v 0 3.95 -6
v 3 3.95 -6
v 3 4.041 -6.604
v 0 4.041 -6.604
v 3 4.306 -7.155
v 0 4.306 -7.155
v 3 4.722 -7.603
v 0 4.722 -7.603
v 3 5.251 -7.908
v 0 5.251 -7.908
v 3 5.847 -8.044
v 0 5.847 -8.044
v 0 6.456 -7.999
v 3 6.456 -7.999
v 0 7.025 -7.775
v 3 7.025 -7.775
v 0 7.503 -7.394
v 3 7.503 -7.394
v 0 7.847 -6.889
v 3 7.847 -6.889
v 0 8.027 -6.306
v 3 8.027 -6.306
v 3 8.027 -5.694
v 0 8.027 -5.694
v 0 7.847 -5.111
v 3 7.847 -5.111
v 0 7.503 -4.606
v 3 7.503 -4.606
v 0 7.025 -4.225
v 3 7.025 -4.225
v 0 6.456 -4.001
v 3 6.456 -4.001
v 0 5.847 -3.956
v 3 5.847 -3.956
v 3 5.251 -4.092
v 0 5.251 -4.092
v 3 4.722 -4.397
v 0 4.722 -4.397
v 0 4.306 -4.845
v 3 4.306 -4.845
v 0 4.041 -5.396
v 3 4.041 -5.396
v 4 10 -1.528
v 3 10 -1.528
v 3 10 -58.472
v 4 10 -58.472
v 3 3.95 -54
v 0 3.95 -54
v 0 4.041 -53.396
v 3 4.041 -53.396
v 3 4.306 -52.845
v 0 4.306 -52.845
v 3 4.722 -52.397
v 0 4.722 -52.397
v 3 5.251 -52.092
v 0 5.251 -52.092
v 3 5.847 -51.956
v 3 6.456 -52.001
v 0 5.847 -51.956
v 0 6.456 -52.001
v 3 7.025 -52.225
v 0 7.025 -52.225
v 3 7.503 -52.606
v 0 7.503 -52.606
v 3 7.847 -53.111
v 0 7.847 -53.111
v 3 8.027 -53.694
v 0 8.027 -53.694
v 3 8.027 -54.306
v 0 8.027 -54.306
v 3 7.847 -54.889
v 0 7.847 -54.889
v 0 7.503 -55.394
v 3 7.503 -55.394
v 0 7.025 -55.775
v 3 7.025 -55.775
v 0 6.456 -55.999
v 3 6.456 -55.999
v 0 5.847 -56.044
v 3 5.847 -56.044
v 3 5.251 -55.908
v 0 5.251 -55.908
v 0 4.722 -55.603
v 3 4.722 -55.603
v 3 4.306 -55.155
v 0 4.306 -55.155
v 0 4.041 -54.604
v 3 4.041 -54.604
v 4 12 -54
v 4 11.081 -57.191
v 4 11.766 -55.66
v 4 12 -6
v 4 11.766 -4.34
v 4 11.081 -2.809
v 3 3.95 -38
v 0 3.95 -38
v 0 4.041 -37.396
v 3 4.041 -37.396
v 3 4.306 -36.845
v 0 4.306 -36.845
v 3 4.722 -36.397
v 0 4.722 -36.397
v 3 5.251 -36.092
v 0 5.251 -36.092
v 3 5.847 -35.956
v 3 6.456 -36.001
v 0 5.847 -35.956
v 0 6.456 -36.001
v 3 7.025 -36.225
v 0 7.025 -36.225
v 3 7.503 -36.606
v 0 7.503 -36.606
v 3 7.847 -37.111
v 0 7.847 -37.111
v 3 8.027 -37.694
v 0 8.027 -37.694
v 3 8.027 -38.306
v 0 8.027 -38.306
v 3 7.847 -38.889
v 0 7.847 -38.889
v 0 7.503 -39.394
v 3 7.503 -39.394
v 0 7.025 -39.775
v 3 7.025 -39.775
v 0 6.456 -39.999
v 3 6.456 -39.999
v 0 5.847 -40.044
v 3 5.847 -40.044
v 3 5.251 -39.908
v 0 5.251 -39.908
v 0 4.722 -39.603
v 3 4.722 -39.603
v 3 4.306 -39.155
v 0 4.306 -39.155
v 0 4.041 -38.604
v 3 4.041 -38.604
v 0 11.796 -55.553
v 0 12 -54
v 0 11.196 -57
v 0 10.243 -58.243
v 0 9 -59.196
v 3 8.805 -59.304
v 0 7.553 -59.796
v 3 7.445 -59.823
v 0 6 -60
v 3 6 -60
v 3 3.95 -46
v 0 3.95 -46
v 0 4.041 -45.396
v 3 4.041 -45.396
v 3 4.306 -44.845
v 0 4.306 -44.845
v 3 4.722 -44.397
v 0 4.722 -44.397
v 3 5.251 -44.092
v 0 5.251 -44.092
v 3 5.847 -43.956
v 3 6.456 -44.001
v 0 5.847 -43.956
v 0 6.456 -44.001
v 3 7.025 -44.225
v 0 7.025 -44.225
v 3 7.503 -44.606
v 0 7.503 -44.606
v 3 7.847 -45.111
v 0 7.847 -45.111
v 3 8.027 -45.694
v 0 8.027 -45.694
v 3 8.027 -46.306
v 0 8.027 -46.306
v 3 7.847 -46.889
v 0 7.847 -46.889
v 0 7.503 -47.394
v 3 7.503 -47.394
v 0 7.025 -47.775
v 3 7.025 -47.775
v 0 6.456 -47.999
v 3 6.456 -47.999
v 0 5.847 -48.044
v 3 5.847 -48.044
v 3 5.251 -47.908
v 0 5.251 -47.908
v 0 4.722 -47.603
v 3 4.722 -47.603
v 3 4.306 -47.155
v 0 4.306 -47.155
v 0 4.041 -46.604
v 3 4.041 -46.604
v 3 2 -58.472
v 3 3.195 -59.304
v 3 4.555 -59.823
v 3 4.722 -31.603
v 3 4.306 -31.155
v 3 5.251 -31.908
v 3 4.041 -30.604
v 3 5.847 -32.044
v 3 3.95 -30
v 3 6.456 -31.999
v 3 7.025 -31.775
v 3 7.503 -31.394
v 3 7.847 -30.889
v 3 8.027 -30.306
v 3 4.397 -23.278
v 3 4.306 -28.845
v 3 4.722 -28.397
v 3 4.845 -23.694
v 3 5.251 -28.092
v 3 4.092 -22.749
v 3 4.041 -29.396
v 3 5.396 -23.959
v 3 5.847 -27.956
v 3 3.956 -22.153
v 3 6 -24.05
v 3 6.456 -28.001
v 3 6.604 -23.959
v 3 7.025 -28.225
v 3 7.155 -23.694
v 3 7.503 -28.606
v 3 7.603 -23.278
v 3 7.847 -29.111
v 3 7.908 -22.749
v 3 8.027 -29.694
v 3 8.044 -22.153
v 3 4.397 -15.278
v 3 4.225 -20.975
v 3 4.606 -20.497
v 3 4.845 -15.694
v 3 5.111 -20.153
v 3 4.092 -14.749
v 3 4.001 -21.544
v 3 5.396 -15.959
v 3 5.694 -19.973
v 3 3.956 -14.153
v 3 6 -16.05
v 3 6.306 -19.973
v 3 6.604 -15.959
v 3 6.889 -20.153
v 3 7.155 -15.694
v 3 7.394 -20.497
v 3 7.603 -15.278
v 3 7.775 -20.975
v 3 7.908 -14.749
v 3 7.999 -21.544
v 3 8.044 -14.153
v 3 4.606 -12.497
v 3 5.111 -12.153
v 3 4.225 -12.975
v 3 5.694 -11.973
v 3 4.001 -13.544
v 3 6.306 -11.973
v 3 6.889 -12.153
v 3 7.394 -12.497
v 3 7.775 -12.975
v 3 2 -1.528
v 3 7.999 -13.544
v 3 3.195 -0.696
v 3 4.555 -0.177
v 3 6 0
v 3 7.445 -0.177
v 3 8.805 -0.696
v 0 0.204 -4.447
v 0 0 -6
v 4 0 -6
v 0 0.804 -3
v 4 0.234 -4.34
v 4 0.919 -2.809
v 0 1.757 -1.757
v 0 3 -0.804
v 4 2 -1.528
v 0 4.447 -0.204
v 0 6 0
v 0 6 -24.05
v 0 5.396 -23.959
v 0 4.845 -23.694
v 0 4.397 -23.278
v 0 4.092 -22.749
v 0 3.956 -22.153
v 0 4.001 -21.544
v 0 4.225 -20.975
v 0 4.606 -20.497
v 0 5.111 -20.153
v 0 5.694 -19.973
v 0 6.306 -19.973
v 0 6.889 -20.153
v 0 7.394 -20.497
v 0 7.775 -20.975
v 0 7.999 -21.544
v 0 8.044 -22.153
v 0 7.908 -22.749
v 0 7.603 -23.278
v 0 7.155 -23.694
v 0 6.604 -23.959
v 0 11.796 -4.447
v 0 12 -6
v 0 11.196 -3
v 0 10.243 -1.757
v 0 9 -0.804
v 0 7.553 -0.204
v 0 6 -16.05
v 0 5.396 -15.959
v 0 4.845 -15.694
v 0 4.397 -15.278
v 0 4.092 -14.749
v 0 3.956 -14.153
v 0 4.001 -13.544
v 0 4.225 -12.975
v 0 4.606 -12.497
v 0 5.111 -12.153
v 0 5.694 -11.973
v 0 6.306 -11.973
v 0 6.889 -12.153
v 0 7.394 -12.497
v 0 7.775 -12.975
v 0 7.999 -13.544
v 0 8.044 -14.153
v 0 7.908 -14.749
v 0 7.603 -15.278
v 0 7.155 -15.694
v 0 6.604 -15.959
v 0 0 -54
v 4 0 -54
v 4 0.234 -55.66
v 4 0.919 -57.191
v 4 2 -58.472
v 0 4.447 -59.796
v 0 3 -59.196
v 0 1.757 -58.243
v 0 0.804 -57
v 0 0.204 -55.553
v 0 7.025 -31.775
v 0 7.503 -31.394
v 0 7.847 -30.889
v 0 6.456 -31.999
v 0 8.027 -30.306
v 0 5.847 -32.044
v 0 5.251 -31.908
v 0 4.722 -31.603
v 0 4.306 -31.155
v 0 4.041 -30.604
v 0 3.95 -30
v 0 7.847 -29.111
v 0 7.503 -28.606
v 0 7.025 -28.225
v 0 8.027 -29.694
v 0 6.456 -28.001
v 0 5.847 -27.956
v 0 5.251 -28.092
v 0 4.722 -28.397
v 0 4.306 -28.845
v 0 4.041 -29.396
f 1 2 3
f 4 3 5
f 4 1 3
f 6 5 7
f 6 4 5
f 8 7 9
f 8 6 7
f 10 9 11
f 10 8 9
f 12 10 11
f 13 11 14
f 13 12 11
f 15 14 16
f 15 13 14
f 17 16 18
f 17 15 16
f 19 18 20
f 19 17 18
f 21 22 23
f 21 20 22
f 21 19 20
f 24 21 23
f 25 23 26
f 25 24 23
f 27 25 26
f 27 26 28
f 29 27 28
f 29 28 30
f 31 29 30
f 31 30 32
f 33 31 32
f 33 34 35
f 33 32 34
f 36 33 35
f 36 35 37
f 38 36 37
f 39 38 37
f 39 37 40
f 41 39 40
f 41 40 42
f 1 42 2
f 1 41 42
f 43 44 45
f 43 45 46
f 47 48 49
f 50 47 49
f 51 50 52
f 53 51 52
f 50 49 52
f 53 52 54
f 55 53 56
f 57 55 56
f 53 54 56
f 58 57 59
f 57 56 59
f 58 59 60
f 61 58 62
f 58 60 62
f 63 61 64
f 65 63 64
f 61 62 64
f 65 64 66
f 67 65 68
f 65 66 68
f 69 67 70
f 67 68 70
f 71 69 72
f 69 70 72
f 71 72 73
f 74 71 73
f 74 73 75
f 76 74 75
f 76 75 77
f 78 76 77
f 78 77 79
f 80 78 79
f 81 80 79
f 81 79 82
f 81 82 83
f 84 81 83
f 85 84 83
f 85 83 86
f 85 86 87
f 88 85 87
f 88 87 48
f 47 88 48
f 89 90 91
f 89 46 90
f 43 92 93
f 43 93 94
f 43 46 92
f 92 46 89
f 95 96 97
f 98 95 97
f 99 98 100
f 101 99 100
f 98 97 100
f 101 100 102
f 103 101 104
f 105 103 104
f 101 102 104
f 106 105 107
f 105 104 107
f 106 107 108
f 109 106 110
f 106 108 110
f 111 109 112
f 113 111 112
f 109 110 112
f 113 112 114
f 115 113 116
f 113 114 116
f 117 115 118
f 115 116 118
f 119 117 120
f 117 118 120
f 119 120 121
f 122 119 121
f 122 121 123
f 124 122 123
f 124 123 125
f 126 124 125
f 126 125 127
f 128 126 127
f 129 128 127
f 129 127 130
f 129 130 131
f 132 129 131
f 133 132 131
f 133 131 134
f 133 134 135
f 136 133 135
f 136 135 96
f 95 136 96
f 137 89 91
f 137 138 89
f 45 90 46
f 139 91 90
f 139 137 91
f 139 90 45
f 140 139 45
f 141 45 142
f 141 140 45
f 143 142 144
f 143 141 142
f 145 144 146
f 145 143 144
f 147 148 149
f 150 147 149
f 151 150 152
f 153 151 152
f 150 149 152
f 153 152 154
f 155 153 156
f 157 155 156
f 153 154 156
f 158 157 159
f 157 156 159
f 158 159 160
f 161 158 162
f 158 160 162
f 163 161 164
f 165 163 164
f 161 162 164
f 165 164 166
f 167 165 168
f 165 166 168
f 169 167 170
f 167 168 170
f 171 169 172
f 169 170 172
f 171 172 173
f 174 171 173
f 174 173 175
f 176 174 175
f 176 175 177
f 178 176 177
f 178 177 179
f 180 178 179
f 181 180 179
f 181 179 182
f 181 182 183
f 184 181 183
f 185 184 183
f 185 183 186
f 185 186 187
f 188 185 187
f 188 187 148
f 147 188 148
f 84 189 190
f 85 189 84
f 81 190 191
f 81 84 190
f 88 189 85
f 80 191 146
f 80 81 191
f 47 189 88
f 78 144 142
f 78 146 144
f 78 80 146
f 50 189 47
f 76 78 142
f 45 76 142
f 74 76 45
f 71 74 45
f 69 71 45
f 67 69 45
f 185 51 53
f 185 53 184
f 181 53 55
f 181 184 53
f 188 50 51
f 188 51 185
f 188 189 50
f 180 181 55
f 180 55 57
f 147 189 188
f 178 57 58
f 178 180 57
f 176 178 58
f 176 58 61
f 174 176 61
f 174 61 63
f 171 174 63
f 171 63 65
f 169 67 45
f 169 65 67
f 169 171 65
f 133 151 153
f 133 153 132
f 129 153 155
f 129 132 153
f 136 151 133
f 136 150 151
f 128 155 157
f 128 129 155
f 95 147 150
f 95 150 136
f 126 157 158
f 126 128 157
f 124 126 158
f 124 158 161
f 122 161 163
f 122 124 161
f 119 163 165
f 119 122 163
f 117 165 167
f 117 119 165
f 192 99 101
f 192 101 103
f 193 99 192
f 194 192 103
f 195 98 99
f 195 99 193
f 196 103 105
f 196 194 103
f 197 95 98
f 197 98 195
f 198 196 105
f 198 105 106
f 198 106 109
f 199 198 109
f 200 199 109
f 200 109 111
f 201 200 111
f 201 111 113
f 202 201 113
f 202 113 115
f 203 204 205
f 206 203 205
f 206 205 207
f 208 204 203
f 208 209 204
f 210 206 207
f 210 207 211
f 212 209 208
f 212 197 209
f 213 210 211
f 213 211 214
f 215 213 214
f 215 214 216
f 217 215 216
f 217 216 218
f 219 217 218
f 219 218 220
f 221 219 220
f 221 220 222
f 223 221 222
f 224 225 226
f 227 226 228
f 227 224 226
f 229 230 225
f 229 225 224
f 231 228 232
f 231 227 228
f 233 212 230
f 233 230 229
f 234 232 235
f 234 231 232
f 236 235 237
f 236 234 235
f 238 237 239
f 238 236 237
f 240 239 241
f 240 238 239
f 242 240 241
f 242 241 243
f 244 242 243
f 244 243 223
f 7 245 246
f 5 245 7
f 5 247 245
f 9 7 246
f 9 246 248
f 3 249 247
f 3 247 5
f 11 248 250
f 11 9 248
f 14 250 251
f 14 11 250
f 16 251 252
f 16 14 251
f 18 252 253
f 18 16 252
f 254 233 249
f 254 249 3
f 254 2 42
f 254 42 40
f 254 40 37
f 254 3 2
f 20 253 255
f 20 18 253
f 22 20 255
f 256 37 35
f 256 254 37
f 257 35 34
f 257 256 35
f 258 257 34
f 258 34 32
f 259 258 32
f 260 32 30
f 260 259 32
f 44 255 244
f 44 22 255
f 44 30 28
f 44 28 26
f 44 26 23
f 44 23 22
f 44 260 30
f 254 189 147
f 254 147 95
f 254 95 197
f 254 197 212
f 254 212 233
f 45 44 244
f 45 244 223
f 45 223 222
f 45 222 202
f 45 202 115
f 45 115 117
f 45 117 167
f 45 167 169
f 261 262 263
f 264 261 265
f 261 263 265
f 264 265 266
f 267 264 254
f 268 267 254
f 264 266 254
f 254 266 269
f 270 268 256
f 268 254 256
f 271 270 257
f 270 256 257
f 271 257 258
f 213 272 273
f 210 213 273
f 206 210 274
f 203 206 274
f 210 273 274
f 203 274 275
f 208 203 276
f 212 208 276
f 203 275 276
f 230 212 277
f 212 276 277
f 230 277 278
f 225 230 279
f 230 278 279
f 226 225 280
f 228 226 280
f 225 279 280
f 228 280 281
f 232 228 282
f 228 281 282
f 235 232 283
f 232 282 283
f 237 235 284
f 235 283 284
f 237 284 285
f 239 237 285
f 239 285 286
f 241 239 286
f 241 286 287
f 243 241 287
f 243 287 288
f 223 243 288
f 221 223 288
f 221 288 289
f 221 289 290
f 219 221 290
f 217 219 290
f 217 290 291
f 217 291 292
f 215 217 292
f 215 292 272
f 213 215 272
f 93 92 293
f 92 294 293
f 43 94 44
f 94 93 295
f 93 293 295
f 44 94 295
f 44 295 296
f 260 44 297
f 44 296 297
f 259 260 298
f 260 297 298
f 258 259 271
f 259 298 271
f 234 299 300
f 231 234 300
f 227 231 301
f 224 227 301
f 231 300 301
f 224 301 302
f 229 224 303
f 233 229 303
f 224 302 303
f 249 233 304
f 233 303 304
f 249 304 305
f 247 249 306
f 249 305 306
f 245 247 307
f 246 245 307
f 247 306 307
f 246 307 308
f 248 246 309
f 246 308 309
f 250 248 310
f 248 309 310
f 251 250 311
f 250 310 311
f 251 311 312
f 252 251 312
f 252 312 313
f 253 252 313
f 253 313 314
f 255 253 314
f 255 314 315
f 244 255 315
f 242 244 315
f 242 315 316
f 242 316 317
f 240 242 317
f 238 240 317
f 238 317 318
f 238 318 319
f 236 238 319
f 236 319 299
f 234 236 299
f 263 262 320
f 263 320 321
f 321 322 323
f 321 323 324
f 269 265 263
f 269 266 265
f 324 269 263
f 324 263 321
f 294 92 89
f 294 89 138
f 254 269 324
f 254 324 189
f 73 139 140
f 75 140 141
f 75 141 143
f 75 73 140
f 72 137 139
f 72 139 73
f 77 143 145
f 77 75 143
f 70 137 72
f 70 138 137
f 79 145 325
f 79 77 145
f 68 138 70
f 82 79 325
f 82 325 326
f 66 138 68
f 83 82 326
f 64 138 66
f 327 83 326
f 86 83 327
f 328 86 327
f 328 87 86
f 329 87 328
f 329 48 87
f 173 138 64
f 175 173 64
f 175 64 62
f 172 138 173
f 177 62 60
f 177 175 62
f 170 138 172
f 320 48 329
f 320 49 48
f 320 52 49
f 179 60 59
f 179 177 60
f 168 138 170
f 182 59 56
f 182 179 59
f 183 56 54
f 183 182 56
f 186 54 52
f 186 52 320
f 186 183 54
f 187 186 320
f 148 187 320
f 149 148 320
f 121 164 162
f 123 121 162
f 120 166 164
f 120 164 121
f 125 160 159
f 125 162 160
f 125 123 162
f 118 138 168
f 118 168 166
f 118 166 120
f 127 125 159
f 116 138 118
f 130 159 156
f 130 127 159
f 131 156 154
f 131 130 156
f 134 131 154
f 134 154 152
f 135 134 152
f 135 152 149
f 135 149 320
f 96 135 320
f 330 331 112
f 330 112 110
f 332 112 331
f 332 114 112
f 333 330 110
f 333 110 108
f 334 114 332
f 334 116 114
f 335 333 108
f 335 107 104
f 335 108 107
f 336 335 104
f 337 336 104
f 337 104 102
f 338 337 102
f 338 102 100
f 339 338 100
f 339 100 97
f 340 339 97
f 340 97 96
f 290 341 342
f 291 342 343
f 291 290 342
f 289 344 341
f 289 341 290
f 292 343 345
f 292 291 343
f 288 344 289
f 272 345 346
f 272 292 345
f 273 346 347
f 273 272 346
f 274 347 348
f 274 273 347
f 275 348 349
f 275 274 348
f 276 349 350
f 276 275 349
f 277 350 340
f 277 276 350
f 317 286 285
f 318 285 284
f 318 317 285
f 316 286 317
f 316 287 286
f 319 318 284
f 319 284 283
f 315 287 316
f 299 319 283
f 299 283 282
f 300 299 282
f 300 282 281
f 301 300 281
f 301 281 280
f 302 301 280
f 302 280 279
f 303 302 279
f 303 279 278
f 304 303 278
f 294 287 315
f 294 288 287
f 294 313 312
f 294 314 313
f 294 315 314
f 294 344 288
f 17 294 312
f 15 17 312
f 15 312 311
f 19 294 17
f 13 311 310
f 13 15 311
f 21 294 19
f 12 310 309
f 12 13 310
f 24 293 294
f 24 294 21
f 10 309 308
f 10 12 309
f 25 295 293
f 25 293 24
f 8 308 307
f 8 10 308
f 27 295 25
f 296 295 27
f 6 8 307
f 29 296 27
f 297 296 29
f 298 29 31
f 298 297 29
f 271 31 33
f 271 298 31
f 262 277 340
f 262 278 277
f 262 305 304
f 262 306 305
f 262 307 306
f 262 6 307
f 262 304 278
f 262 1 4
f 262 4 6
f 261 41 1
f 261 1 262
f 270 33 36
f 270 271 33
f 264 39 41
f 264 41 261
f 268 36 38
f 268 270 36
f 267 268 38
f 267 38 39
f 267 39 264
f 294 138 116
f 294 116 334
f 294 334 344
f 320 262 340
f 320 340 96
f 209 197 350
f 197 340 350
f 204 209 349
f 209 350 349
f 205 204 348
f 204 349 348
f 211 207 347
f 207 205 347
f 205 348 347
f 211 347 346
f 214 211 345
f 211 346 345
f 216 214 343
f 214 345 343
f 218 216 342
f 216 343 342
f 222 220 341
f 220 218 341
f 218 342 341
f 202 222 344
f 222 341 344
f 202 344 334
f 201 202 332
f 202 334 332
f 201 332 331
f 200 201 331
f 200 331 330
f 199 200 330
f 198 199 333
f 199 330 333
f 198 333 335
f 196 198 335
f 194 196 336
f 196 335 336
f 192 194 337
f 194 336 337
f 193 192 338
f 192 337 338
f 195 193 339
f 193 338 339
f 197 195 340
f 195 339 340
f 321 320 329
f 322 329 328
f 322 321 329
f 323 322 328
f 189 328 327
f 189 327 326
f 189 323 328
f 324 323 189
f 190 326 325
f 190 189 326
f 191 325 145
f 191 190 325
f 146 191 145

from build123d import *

# Parameters (mm, degrees)
BOSS_EXTRUDE1_DEPTH     = 60
FILLET1_R               = 6
SKETCH2_R               = 2.05
CUT_EXTRUDE1_DEPTH      = 62.318838867
LPATTERN1_COUNT         = 4
LPATTERN1_PITCH         = 8
MIRROR1_COPY_1_SKETCH_R = 2.05
MIRROR1_COPY_1_DEPTH    = 62.318838867
MIRROR1_COPY_2_SKETCH_R = 2.05
MIRROR1_COPY_2_DEPTH    = 62.318838867
MIRROR1_COPY_3_SKETCH_R = 2.05
MIRROR1_COPY_3_DEPTH    = 62.318838867


with BuildPart() as part:
    # Sketch1 → Boss-Extrude1 (new body)
    with BuildSketch(Plane.XY):
        Polygon((0, 0), (4, 0), (4, 2), (3, 2), (3, 10), (4, 10), (4, 12), (0, 12), align=None)
    extrude(amount=-BOSS_EXTRUDE1_DEPTH)

    # Fillet1
    fillet1_edges = [part.edges().sort_by_distance(p)[0] for p in [
        (2, 12, 0),
        (2, 0, 0),
        (2, 0, -60),
        (2, 12, -60),
    ]]
    fillet(fillet1_edges, radius=FILLET1_R - 0.0001)  # a hair under: the kernel refuses the full size

    # Sketch2 → Cut-Extrude1 (cut, through all)
    with BuildSketch(Plane.ZY):
        with Locations(Location((-54, 6, 0), (0, 0, 270))):
            Circle(SKETCH2_R)
    cut_extrude1 = extrude(amount=-CUT_EXTRUDE1_DEPTH, mode=Mode.SUBTRACT)

    # LPattern1: Cut-Extrude1 ×4
    with Locations(*[(0, 0, i * LPATTERN1_PITCH) for i in range(1, LPATTERN1_COUNT)]):
        add(cut_extrude1, mode=Mode.SUBTRACT)

    # Mirror1: Cut-Extrude1 across plane
    add(cut_extrude1.mirror(Plane.XY.offset(-30)), mode=Mode.SUBTRACT)

    # Mirror1 copy 1 sketch → Mirror1 copy 1 (cut, through all)
    with BuildSketch(Plane(origin=(0, 0, -68), x_dir=(0, 0, -1), z_dir=(-1, 0, 0))):
        with Locations((-54, -6)):
            Circle(MIRROR1_COPY_1_SKETCH_R)
    extrude(amount=-MIRROR1_COPY_1_DEPTH, mode=Mode.SUBTRACT)

    # Mirror1 copy 2 sketch → Mirror1 copy 2 (cut, through all)
    with BuildSketch(Plane(origin=(0, 0, -76), x_dir=(0, 0, -1), z_dir=(-1, 0, 0))):
        with Locations((-54, -6)):
            Circle(MIRROR1_COPY_2_SKETCH_R)
    extrude(amount=-MIRROR1_COPY_2_DEPTH, mode=Mode.SUBTRACT)

    # Mirror1 copy 3 sketch → Mirror1 copy 3 (cut, through all)
    with BuildSketch(Plane(origin=(0, 0, -84), x_dir=(0, 0, -1), z_dir=(-1, 0, 0))):
        with Locations((-54, -6)):
            Circle(MIRROR1_COPY_3_SKETCH_R)
    extrude(amount=-MIRROR1_COPY_3_DEPTH, mode=Mode.SUBTRACT)


solid = part.part
